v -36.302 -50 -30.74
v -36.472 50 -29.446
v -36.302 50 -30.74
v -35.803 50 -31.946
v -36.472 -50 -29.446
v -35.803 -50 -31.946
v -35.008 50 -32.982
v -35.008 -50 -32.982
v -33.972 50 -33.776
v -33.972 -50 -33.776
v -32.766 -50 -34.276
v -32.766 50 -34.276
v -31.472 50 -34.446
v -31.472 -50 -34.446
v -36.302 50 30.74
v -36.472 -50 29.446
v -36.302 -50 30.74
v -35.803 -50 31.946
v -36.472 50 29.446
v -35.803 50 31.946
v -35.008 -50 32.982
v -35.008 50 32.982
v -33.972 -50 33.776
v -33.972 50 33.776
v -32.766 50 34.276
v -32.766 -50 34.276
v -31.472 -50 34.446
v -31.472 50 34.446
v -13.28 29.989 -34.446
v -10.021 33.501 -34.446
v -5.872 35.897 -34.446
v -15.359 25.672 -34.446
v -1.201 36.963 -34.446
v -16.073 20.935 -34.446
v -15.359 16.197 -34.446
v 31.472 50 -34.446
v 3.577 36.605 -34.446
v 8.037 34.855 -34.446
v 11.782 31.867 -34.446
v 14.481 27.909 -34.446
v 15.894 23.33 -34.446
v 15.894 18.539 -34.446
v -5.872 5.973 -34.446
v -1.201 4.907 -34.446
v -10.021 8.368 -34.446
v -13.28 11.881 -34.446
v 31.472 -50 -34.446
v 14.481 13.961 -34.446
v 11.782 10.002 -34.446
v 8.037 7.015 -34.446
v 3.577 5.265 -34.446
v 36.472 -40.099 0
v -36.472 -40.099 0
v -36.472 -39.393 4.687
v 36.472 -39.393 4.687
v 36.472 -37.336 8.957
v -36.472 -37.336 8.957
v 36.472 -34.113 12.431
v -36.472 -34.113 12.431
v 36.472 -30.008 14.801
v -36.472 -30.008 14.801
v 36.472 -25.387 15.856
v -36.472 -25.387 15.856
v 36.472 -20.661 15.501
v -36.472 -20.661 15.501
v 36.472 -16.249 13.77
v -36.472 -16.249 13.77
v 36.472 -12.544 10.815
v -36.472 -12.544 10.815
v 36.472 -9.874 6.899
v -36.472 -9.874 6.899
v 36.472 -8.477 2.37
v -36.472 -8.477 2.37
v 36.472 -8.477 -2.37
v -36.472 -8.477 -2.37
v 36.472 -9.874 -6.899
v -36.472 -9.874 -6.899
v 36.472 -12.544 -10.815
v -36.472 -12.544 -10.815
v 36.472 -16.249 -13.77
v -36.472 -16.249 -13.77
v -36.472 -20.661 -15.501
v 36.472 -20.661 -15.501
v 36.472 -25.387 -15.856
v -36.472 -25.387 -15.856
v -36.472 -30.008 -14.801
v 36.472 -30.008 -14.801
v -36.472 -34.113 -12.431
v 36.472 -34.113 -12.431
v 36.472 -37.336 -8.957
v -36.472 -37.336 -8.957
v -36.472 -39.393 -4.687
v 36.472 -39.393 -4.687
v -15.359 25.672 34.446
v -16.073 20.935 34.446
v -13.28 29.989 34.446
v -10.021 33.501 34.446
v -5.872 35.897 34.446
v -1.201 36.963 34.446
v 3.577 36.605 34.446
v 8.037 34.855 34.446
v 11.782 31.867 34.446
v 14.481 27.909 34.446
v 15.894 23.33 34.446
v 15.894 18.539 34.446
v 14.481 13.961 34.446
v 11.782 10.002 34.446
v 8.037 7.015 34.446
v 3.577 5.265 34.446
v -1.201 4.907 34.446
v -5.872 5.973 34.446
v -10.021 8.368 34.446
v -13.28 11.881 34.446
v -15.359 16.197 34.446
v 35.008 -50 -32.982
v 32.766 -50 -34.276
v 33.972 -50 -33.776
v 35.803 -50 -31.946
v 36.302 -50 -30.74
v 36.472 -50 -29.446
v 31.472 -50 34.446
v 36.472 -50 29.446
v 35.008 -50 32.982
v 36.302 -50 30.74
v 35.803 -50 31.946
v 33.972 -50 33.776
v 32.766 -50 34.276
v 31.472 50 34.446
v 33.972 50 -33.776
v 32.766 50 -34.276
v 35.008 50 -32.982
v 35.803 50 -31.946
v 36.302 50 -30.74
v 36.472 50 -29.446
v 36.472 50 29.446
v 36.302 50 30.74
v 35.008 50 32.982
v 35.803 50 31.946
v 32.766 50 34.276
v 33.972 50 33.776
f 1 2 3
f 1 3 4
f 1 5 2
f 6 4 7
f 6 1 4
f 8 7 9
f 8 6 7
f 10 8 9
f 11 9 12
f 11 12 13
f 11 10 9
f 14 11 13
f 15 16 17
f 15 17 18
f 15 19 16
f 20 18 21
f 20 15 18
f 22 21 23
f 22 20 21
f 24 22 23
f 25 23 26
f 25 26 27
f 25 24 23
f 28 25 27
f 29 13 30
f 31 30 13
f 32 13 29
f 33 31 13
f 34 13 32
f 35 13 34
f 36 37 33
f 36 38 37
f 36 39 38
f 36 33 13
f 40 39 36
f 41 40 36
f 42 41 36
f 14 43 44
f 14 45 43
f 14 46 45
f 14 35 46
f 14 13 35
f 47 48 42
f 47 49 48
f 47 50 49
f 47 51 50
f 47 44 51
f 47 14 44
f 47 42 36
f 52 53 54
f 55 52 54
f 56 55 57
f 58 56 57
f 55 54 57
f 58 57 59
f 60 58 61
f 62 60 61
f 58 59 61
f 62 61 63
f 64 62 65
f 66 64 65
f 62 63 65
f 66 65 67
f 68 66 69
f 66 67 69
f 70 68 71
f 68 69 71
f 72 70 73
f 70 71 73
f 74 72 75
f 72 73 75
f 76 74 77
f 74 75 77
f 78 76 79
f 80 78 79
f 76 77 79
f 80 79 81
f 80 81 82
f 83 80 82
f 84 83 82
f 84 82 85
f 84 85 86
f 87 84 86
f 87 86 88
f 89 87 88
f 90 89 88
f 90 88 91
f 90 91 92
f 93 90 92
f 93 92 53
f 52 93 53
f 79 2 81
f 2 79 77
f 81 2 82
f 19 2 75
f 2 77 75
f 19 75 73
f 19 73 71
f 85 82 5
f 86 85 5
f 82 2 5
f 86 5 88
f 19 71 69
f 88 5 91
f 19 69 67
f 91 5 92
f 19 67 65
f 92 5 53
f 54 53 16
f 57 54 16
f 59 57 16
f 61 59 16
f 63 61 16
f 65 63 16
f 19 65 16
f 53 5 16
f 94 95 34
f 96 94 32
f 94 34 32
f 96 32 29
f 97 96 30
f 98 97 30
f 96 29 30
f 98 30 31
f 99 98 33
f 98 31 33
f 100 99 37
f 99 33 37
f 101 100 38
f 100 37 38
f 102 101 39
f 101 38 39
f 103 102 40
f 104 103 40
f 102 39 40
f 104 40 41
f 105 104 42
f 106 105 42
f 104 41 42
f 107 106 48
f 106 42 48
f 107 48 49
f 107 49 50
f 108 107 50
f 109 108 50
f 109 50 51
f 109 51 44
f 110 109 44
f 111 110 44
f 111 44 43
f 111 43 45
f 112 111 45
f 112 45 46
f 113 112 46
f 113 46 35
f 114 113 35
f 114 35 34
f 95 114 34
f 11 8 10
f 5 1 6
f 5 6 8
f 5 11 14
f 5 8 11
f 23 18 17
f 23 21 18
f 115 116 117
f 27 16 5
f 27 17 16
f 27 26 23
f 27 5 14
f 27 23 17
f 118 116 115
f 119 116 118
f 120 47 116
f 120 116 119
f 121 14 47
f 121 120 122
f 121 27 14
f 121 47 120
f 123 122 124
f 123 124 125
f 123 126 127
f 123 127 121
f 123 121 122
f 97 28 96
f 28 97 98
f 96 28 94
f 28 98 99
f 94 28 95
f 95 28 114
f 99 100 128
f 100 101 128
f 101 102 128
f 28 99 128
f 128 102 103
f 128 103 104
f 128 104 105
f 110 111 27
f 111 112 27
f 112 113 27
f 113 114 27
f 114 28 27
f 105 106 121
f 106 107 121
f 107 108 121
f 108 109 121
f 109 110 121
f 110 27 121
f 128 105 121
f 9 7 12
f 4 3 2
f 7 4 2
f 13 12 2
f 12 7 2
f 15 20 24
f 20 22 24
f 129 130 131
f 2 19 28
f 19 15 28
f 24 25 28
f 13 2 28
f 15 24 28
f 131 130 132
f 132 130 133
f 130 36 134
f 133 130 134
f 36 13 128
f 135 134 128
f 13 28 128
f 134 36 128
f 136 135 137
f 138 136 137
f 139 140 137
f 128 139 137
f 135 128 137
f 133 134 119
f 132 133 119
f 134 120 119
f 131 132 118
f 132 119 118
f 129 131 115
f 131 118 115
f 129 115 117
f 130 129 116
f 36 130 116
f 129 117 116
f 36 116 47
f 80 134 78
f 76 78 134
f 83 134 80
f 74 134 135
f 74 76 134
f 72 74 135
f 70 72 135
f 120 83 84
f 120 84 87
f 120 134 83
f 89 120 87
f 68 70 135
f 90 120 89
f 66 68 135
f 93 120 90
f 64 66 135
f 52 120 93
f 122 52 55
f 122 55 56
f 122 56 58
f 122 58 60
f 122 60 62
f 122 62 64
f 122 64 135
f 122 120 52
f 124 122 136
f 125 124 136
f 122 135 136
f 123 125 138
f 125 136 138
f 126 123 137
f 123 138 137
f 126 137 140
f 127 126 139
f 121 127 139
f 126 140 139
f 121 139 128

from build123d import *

# Parameters (mm, degrees)
F0_W     = 72.9447603226
F0_H     = 68.892262876
F1_DEPTH = 50
F3_R     = 5
F4_D     = 31.8
F6_D     = 32.14624


with BuildPart() as f1:
    # F0 (on Front) → F1 (new body, symmetric)
    with BuildSketch(Plane.XZ):
        Rectangle(F0_W, F0_H)
    extrude(amount=F1_DEPTH, both=True)

    # F3
    f3_edges = [f1.edges().sort_by_distance(p)[0] for p in [
        (36.47238, 0, 34.446131),
        (-36.47238, 0, 34.446131),
        (36.47238, 0, -34.446131),
        (-36.47238, 0, -34.446131),
    ]]
    fillet(f3_edges, radius=F3_R)

    # F4 (through all)
    with Locations(Plane.YZ.offset(36.4723801613)):
        with Locations((-24.1992101073, 0)):
            Hole(F4_D / 2)

    # F6 (through all)
    with Locations(Plane.XY.offset(34.446131438)):
        with Locations((0, 20.9348257631)):
            Hole(F6_D / 2)


solid = f1.part
